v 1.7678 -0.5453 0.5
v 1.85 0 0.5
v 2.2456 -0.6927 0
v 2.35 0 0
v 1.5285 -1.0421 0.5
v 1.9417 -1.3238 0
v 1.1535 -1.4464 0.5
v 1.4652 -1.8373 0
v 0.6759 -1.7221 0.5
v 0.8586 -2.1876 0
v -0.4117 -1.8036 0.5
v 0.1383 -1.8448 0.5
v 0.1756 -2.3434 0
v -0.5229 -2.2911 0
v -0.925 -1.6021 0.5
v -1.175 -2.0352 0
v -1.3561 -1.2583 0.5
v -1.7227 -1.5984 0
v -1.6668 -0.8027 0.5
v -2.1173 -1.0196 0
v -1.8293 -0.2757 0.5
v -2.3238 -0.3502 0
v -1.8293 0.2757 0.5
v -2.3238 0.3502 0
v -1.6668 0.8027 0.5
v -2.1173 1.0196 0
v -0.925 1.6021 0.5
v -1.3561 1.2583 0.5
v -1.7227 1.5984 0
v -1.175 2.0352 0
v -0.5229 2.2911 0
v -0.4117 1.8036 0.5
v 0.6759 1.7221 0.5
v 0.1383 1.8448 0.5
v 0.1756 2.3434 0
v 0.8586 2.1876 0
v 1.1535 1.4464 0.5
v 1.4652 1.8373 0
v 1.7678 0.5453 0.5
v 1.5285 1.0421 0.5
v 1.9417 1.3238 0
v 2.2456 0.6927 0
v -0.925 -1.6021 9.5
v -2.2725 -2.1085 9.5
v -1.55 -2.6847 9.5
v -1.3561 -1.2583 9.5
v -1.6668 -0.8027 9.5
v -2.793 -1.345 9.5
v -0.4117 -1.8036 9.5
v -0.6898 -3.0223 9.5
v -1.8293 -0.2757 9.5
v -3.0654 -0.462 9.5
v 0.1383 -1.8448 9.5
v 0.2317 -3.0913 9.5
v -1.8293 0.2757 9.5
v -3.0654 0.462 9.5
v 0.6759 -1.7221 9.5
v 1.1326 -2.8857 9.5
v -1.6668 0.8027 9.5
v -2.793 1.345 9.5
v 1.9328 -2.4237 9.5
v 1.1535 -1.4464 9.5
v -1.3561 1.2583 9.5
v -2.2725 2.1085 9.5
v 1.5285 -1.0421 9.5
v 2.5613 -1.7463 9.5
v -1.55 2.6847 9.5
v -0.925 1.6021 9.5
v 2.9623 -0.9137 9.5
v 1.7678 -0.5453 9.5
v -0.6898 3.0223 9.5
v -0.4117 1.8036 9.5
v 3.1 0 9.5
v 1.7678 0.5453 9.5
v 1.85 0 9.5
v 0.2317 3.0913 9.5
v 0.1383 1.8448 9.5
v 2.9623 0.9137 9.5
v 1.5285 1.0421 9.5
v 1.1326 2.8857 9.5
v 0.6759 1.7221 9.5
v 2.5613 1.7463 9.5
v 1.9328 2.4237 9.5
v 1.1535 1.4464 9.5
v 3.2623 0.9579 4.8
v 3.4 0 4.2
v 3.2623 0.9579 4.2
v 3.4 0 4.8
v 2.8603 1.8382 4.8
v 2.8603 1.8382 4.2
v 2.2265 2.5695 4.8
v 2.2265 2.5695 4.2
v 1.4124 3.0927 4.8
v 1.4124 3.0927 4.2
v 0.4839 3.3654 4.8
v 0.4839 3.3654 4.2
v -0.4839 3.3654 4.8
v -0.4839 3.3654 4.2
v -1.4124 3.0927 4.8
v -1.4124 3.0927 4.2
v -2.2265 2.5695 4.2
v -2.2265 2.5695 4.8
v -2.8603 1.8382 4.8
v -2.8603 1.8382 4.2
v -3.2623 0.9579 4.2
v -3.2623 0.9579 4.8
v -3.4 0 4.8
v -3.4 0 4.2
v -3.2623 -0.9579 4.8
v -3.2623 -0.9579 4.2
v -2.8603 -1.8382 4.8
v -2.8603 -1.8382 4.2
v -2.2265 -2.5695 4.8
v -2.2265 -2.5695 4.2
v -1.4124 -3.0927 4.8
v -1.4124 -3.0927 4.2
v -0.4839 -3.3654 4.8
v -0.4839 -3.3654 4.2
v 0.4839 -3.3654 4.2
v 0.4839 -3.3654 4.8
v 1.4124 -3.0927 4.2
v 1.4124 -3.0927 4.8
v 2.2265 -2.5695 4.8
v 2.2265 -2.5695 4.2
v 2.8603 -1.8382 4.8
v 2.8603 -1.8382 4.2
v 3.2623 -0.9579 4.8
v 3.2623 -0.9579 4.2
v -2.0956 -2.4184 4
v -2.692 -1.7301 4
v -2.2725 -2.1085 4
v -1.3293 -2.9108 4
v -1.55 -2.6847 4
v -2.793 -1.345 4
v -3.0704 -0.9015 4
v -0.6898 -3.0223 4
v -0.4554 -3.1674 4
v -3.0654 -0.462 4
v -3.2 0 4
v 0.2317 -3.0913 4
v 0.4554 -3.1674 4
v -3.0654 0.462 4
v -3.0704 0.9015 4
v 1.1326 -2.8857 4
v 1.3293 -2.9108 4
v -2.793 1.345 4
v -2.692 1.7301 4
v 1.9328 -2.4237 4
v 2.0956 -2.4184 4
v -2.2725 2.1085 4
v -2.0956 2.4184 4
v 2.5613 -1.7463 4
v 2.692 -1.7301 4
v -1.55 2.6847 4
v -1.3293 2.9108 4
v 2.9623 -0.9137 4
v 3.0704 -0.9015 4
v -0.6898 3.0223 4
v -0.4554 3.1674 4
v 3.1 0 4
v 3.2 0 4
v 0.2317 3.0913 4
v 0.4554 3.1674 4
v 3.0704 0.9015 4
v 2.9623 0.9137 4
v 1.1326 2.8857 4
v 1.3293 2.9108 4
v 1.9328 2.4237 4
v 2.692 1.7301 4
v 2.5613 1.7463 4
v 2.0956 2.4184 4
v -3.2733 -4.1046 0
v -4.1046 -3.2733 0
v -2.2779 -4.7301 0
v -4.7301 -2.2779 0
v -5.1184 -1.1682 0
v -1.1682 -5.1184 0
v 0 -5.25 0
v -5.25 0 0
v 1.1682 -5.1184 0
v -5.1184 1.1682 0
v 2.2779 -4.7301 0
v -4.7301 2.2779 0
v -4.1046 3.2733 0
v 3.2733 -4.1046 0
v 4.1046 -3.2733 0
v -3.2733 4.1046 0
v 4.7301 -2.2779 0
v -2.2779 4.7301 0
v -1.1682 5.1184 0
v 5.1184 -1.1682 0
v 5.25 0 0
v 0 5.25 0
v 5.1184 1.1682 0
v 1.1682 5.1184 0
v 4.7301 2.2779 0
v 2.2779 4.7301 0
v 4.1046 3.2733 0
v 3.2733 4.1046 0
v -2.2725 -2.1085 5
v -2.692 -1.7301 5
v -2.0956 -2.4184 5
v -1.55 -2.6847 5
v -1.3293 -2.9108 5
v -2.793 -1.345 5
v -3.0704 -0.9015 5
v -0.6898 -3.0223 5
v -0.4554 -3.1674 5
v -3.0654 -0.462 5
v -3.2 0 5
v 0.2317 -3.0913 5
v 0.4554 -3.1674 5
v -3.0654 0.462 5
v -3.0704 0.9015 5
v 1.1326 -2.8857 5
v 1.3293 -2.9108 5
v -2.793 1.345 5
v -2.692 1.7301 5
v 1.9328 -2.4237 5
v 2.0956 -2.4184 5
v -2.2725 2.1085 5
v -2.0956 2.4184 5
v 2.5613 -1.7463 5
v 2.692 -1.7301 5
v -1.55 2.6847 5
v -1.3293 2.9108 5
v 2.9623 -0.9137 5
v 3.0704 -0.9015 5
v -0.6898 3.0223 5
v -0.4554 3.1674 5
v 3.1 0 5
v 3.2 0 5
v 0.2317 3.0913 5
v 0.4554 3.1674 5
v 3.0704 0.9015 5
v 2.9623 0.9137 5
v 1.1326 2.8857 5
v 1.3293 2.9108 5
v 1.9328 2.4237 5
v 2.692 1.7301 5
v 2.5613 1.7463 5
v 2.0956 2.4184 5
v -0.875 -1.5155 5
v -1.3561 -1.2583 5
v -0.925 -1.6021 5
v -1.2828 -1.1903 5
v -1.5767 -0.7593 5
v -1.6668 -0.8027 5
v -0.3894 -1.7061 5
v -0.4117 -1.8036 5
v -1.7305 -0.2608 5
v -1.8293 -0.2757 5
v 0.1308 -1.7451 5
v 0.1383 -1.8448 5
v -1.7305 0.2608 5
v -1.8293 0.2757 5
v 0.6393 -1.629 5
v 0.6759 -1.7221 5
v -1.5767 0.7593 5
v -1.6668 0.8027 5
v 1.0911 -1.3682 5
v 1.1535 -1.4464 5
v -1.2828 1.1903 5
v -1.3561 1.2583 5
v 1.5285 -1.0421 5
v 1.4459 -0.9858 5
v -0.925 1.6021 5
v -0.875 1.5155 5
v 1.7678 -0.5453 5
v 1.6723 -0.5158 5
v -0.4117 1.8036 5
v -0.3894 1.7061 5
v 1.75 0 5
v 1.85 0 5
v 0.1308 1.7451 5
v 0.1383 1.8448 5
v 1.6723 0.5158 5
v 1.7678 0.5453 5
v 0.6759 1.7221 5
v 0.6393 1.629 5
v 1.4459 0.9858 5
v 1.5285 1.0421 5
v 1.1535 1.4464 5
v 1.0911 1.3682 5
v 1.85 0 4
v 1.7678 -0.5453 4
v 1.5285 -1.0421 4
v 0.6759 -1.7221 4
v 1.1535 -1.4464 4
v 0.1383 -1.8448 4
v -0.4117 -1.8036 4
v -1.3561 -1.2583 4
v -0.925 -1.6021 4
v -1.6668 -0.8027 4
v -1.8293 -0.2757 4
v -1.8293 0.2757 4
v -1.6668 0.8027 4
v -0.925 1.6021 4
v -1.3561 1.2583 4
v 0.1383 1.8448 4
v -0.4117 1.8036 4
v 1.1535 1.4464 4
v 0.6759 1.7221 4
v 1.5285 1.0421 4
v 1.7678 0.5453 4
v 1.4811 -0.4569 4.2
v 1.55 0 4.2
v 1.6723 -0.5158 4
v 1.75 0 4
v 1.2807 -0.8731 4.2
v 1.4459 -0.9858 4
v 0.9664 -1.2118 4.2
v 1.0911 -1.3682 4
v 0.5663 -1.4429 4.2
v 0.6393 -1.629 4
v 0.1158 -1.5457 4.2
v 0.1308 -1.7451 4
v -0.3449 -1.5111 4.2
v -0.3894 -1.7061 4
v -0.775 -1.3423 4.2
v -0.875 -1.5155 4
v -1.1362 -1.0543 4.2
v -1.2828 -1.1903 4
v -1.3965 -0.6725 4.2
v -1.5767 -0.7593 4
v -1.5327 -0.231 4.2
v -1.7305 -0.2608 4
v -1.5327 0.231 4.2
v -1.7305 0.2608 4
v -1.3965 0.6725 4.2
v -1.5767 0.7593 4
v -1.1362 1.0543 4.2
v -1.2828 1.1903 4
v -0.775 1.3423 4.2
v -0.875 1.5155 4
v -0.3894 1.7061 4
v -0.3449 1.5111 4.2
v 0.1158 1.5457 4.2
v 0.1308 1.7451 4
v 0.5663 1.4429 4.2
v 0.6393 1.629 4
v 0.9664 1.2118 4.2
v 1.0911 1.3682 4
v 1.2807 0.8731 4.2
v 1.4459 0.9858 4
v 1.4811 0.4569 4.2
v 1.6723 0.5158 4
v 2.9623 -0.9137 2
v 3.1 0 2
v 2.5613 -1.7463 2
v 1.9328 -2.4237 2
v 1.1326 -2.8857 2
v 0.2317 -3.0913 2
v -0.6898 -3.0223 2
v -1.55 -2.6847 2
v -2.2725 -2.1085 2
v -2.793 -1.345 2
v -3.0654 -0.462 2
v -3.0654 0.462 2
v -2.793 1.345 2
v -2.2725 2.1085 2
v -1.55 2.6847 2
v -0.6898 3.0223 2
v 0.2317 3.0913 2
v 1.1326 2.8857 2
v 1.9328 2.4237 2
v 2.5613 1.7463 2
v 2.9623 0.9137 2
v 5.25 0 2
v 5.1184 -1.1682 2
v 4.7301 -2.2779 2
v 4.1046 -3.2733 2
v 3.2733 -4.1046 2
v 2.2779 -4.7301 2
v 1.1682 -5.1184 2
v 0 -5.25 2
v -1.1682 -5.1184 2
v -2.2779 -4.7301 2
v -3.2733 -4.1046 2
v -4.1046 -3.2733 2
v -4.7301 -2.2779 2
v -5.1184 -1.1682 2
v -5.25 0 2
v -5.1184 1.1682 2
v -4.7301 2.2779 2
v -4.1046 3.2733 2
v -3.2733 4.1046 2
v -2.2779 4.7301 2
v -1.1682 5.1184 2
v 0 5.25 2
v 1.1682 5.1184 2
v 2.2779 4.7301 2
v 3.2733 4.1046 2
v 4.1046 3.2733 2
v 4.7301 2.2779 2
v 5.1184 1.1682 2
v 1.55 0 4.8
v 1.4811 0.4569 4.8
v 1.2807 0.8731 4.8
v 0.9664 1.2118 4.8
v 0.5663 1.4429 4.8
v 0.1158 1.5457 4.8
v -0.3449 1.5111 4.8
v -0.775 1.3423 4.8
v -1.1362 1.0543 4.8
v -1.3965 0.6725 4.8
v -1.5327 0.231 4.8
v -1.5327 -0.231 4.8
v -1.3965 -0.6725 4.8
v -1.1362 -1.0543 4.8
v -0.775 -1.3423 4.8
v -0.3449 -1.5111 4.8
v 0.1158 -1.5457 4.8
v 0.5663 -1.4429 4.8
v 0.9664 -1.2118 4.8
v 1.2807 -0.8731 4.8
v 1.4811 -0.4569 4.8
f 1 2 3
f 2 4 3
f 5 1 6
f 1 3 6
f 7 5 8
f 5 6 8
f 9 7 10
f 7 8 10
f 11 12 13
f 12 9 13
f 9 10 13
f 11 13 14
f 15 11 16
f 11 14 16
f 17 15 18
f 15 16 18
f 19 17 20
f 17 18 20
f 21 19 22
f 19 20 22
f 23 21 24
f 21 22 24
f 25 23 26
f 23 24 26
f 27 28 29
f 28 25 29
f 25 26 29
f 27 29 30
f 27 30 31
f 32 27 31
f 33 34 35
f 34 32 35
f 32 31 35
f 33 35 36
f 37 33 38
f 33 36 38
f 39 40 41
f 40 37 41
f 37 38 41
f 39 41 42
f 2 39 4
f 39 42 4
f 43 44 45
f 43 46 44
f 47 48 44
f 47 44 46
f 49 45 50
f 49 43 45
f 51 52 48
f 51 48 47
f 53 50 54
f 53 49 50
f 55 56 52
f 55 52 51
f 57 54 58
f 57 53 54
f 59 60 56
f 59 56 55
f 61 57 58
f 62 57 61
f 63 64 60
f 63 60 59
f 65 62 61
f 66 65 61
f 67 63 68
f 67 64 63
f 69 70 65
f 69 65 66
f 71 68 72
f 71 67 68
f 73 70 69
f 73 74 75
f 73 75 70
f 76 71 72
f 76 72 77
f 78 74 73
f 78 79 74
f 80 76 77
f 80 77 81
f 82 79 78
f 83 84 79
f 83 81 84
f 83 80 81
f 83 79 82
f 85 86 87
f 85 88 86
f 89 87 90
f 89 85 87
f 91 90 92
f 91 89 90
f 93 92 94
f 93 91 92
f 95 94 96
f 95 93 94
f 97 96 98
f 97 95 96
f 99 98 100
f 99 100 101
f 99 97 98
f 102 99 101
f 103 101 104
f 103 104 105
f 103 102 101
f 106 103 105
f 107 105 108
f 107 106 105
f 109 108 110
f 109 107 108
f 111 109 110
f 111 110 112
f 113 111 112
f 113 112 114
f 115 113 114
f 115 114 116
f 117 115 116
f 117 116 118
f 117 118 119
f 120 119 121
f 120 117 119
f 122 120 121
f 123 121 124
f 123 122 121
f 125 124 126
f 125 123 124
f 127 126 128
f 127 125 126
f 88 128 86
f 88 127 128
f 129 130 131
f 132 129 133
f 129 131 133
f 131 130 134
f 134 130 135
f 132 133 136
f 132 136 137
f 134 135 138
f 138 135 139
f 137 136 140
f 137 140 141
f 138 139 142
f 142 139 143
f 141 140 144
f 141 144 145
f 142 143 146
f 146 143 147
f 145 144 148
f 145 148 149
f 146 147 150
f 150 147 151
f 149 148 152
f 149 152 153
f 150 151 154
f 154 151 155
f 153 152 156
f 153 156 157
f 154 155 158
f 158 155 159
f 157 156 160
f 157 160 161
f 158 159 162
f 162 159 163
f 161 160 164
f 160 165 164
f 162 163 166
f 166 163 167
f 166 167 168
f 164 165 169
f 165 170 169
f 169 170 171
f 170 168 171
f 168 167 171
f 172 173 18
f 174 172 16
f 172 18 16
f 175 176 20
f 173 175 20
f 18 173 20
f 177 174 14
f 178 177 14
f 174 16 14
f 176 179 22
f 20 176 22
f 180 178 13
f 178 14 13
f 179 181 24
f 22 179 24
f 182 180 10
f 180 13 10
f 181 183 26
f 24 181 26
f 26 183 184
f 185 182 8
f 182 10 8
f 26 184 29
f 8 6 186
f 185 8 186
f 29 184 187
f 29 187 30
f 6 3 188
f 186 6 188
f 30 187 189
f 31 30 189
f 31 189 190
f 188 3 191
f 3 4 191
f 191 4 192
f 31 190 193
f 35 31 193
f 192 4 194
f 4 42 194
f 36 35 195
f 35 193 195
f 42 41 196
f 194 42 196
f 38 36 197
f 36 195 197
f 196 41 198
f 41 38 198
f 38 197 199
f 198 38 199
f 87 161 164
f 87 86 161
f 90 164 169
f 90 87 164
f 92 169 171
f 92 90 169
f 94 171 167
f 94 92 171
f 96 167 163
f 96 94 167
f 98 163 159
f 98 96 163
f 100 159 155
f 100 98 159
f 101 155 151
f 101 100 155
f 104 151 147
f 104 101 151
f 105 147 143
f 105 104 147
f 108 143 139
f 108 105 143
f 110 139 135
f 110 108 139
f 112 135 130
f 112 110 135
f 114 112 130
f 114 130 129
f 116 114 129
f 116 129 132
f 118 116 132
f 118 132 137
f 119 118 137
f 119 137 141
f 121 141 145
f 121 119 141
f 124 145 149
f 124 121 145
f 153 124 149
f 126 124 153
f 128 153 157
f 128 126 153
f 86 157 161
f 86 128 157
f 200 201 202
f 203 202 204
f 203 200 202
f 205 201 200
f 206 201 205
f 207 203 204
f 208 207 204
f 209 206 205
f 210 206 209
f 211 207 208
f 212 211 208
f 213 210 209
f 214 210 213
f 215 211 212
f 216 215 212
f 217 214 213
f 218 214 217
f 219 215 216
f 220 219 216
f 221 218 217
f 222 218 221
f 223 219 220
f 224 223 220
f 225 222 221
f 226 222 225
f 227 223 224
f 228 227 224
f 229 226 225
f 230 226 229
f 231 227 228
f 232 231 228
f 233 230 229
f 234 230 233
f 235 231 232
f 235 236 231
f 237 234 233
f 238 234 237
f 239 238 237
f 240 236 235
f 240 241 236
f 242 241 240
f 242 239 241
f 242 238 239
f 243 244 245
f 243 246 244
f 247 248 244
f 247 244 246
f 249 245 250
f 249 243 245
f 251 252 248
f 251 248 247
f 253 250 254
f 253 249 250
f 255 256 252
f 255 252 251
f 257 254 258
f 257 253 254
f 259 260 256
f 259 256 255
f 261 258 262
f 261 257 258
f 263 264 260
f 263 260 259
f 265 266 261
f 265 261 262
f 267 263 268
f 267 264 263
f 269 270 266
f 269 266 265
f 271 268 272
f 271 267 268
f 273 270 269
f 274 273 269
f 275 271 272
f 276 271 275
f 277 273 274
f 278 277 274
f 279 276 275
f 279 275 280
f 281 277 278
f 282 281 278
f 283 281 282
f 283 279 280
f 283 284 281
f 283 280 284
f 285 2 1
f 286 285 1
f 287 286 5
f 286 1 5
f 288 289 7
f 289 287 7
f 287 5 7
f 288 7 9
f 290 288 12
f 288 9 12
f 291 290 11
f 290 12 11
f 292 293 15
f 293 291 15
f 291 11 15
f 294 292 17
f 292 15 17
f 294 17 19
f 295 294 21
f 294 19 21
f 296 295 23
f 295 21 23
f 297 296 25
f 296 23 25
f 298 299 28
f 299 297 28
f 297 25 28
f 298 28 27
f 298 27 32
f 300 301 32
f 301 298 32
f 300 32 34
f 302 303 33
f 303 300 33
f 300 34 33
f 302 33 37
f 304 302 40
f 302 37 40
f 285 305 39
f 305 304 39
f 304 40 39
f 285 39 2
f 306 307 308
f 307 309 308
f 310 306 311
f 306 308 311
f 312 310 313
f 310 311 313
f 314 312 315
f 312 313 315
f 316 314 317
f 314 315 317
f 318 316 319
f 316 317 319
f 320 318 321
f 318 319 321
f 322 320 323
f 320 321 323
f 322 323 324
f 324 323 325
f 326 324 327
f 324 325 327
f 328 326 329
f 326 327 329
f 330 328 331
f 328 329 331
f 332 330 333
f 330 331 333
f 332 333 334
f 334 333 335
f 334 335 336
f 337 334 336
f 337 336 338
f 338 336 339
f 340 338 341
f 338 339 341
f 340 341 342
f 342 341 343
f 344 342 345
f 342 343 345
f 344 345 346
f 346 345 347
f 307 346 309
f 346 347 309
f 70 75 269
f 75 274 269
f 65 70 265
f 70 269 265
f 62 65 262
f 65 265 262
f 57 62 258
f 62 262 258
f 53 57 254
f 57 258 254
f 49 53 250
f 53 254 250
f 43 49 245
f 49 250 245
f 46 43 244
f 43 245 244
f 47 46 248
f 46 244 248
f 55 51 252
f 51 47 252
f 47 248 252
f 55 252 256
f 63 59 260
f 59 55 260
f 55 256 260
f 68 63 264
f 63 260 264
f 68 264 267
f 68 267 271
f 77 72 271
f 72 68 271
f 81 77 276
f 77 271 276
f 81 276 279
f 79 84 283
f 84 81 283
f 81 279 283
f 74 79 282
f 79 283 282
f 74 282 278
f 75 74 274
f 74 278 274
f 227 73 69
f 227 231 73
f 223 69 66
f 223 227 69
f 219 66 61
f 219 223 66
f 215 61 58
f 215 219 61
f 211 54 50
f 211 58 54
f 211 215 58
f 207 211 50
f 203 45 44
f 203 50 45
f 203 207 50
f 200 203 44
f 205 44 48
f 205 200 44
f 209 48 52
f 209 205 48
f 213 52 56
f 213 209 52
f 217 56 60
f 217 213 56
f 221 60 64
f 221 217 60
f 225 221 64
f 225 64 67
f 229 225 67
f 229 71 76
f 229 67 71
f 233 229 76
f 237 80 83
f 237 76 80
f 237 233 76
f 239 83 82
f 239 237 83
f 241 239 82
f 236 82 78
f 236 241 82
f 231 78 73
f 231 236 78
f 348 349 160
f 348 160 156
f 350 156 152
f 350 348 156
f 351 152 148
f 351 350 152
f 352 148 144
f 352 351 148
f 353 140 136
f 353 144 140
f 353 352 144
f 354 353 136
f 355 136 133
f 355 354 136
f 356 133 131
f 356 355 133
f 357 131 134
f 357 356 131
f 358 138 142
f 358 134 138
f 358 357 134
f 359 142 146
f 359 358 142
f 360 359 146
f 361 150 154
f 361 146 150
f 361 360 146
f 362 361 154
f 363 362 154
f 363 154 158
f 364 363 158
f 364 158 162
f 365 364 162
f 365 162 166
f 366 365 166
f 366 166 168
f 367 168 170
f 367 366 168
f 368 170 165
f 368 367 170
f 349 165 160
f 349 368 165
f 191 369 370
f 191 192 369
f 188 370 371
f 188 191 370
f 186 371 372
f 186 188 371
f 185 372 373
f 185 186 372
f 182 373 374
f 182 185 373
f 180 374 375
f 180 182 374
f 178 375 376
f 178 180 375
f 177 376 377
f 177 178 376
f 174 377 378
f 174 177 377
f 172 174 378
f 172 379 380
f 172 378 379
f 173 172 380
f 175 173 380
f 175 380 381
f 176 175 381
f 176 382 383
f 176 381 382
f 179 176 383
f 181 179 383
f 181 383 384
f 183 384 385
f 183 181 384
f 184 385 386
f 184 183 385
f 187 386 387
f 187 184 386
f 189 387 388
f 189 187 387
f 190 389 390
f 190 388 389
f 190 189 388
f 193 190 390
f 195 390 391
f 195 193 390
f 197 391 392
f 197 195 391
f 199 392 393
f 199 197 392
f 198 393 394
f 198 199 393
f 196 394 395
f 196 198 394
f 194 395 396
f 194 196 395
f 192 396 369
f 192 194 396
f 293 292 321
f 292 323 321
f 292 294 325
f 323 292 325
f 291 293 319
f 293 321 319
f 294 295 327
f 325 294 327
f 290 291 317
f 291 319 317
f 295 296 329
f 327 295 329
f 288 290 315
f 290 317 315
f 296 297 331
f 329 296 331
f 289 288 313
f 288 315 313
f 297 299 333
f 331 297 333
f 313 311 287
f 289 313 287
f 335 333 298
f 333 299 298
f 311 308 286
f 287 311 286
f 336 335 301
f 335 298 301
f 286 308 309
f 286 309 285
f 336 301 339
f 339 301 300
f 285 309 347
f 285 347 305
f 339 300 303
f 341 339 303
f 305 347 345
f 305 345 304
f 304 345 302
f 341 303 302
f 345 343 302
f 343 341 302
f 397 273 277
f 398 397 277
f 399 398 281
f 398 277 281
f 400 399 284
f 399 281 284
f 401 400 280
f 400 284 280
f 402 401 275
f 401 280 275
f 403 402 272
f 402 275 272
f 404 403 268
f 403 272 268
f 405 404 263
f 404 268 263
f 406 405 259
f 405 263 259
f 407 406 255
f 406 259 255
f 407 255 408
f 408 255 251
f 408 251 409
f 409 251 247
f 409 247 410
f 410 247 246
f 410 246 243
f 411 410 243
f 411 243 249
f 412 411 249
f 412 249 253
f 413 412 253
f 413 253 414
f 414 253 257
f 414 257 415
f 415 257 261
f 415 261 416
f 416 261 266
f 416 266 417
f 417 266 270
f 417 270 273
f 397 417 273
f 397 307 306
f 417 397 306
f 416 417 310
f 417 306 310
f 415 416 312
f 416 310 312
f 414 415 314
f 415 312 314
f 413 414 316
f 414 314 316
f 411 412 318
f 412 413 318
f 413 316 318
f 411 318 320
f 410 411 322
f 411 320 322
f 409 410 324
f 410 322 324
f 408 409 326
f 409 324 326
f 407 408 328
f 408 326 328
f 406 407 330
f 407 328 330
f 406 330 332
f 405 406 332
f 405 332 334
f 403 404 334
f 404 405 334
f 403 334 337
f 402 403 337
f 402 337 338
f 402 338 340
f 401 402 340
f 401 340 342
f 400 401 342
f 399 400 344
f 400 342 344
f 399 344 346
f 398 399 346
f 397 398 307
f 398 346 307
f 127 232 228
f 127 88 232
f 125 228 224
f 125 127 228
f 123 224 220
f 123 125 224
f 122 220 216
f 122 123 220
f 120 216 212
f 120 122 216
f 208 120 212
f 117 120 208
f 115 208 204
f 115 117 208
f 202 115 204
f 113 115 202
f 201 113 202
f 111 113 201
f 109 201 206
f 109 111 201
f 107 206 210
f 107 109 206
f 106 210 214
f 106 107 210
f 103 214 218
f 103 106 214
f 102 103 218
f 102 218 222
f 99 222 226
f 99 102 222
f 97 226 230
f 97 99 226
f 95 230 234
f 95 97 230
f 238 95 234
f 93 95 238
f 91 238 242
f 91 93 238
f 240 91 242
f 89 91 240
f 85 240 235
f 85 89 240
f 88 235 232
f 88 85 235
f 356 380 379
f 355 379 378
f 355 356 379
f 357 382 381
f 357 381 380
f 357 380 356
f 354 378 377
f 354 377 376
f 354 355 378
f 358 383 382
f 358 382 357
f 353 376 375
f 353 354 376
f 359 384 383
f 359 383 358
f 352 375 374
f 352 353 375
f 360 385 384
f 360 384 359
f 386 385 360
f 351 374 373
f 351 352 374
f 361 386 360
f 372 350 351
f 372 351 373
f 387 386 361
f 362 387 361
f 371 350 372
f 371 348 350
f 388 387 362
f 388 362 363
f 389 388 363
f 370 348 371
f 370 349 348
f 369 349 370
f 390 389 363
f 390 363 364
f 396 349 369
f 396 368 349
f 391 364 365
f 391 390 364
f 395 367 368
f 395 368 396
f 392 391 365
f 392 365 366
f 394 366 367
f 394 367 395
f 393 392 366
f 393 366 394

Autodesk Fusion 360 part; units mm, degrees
sketch "Sketch1" plane through (0, 0, 0) normal (0, 0, 1) x (1, 0, 0)
  circle A0 centre (0, 0) radius 5.25
  circle A1 centre (0, 0) radius 3.1
  circle A2 centre (0, 0) radius 1.85
  circle A3 centre (0, 0) radius 3.4
  circle A4 centre (0, 0) radius 1.55
  dimension "d1" = 10.5
  dimension "d2" = 6.2
  dimension "d3" = 3.7
  dimension "d21" = 0.3
  dimension "d22" = 0.3
extrude "Extrude1" add sketch "Sketch1" along normal blind 9.5 contours A1
extrude "Extrude2" add sketch "Sketch1" along normal blind 2 contours A0 | A3
extrude "Extrude3" add sketch "Sketch1" along normal blind 4 and the other way blind -5 contours A3
chamfer "Chamfer1" distance 0.2 angle 45 2 edges at (-3.1699, -1.2295, 4) (-3.1699, -1.2295, 5)
chamfer "Chamfer2" distance 0.5 angle 45 1 edges at (-1.7248, 0.669, 0)
extrude "Extrude4" add sketch "Sketch1" along normal blind 5 and the other way blind -4 contours A2
chamfer "Chamfer3" distance 0.2 angle 45 2 edges at (-1.4451, 0.5605, 5) (-1.4451, 0.5605, 4)
equation "d2 = OuterRadius"
equation "d3 = InnerRadius"
equation "d21 = NotchThickness"
equation "d22 = NotchThickness"
equation "InnerRadius = 3.7 mm"
equation "OuterRadius = 6.2 mm"
equation "NotchThickness = 0.30 mm"
